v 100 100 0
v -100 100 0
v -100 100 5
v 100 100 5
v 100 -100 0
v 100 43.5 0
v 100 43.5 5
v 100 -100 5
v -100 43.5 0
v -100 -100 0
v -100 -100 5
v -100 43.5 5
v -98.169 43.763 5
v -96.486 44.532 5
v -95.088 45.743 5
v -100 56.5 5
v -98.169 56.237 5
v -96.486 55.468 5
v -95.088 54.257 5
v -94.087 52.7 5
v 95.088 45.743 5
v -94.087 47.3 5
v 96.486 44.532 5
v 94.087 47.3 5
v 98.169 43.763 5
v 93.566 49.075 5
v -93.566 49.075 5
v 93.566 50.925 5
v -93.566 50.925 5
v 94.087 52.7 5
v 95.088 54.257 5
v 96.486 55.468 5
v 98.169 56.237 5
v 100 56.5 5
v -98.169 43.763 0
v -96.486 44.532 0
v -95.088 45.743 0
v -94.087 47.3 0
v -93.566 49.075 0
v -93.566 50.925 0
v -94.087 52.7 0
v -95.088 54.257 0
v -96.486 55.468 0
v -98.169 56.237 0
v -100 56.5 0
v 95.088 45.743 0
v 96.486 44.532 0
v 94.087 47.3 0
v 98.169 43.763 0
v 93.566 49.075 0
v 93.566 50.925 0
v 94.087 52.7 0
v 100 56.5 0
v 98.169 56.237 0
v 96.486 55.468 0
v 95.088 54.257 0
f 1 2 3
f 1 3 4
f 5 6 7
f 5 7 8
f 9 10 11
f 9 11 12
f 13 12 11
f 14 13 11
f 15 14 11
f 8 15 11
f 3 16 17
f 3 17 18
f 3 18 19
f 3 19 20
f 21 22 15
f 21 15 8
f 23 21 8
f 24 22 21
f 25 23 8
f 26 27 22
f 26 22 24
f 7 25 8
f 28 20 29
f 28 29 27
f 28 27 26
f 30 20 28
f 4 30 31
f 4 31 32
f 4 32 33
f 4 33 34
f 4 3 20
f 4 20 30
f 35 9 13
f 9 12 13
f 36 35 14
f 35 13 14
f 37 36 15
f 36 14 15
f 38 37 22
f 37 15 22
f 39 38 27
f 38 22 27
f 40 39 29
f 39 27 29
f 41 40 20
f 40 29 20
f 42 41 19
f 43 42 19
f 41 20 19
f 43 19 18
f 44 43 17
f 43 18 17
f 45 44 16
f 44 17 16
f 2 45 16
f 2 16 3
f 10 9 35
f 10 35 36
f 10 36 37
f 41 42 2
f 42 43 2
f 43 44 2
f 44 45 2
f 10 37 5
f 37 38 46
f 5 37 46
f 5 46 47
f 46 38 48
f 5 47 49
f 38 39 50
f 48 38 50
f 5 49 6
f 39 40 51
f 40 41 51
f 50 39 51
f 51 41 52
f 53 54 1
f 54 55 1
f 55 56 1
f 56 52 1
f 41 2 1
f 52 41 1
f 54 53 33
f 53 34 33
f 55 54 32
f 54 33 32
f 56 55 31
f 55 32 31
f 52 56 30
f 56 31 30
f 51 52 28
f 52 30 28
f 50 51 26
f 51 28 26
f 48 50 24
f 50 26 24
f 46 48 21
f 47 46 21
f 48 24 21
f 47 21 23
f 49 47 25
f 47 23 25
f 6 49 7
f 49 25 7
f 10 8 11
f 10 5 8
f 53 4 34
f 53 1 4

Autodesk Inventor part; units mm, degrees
ref_plane "YZ Plane" through (0, 0, 0) normal (1, 0, 0) x (0, 1, 0)
ref_plane "XZ Plane" through (0, 0, 0) normal (0, 1, 0) x (-1, 0, 0)
ref_plane "XY Plane" through (0, 0, 0) normal (0, 0, 1) x (1, 0, 0)
sketch "Sketch1" plane through (0, 0, 0) normal (0, 0, 1) x (1, 0, 0)
  line L0 (-100, 100) -> (100, 100)
  line L1 (100, 100) -> (100, -100)
  line L2 (100, -100) -> (-100, -100)
  line L3 (-100, -100) -> (-100, 100)
  line L4 (-100, 100) -> (100, -100) construction
  line L5 (100, 100) -> (-100, -100) construction
  point P0 (0, 0)
  point P1 (0, 0)
  point P2 (0, 0)
  dimension "d25" = 200
  dimension "d26" = 200
extrude "Plate1" add sketch "Sketch1" along normal blind 5
sketch "Sketch6" plane through (0, 0, 5) normal (0, 0, 1) x (1, 0, 0)
  circle A0 centre (-75, 0) radius 15
  circle A1 centre (75, 0) radius 15
  line L0 (0, 0) -> (0, 55.0725) construction
  dimension "d37" = 30
  dimension "d38" = 150
cut "Cut1" [suppressed]
sketch "Sketch8" plane through (0, 0, 0) normal (1, 0, 0) x (0, 1, 0)
  line L0 (-94.2929, 40) -> (94.2929, 40) projected
  circle A0 centre (0, 30) radius 6.5
  line L1 (89.2929, 5) -> (-89.2929, 5) projected
  point P0 (0, 0)
  dimension "d48" = 13
  dimension "d49" = 25
extrude "Extrusion3" [suppressed]
pattern_linear "Rectangular Pattern2" [suppressed]
sketch "Sketch9" plane through (0, 0, 5) normal (0, 0, 1) x (1, 0, 0)
  circle A0 centre (-100, 50) radius 6.5
  point P0 (0, 0)
  point P1 (-225, 50)
  dimension "d55" = 13
  dimension "d73" = 100
  dimension "d74" = 50
extrude "Cut2" cut sketch "Sketch9" against normal blind 5
mirror "Mirror1" about plane through (0, 0, 0) normal (1, 0, 0) of "Cut2"
equation "\"d26\" = Гриндер_высота"
equation "\"d38\" = Гриндер_Валы_между_центрами"
equation "\"d39\" = Thickness"
equation "\"d48\" = Гриндер_диам_отврс_корпуса"
equation "\"d49\" = Гриндер_отступ_отврс_корпуса"
equation "\"d55\" = Гриндер_диам_отврс_корпуса"
equation "\"d57\" = Thickness"
equation "\"d2\" = Thickness"
equation "\"BendReliefWidth\" = Thickness"
equation "\"BendReliefDepth\" = 0.5 * Thickness"
equation "\"TransitionRadius\" = BendRadius"
equation "\"JacobiRadiusSize\" = BendRadius"
equation "\"GapSize\" = Thickness"
equation "\"Гриндер_отступ_отврс_корпуса\" = 25"
equation "\"Гриндер_диам_отврс_корпуса\" = 13"
equation "\"Гриндер_высота\" = 200"
equation "\"Гриндер_Валы_между_центрами\" = 150"
equation "\"Thickness\" = 5"
equation "\"BendRadius\" = 5"
properties part number "NDM-VOS 111 sredder wall _CPY" material "Stainless Steel"
